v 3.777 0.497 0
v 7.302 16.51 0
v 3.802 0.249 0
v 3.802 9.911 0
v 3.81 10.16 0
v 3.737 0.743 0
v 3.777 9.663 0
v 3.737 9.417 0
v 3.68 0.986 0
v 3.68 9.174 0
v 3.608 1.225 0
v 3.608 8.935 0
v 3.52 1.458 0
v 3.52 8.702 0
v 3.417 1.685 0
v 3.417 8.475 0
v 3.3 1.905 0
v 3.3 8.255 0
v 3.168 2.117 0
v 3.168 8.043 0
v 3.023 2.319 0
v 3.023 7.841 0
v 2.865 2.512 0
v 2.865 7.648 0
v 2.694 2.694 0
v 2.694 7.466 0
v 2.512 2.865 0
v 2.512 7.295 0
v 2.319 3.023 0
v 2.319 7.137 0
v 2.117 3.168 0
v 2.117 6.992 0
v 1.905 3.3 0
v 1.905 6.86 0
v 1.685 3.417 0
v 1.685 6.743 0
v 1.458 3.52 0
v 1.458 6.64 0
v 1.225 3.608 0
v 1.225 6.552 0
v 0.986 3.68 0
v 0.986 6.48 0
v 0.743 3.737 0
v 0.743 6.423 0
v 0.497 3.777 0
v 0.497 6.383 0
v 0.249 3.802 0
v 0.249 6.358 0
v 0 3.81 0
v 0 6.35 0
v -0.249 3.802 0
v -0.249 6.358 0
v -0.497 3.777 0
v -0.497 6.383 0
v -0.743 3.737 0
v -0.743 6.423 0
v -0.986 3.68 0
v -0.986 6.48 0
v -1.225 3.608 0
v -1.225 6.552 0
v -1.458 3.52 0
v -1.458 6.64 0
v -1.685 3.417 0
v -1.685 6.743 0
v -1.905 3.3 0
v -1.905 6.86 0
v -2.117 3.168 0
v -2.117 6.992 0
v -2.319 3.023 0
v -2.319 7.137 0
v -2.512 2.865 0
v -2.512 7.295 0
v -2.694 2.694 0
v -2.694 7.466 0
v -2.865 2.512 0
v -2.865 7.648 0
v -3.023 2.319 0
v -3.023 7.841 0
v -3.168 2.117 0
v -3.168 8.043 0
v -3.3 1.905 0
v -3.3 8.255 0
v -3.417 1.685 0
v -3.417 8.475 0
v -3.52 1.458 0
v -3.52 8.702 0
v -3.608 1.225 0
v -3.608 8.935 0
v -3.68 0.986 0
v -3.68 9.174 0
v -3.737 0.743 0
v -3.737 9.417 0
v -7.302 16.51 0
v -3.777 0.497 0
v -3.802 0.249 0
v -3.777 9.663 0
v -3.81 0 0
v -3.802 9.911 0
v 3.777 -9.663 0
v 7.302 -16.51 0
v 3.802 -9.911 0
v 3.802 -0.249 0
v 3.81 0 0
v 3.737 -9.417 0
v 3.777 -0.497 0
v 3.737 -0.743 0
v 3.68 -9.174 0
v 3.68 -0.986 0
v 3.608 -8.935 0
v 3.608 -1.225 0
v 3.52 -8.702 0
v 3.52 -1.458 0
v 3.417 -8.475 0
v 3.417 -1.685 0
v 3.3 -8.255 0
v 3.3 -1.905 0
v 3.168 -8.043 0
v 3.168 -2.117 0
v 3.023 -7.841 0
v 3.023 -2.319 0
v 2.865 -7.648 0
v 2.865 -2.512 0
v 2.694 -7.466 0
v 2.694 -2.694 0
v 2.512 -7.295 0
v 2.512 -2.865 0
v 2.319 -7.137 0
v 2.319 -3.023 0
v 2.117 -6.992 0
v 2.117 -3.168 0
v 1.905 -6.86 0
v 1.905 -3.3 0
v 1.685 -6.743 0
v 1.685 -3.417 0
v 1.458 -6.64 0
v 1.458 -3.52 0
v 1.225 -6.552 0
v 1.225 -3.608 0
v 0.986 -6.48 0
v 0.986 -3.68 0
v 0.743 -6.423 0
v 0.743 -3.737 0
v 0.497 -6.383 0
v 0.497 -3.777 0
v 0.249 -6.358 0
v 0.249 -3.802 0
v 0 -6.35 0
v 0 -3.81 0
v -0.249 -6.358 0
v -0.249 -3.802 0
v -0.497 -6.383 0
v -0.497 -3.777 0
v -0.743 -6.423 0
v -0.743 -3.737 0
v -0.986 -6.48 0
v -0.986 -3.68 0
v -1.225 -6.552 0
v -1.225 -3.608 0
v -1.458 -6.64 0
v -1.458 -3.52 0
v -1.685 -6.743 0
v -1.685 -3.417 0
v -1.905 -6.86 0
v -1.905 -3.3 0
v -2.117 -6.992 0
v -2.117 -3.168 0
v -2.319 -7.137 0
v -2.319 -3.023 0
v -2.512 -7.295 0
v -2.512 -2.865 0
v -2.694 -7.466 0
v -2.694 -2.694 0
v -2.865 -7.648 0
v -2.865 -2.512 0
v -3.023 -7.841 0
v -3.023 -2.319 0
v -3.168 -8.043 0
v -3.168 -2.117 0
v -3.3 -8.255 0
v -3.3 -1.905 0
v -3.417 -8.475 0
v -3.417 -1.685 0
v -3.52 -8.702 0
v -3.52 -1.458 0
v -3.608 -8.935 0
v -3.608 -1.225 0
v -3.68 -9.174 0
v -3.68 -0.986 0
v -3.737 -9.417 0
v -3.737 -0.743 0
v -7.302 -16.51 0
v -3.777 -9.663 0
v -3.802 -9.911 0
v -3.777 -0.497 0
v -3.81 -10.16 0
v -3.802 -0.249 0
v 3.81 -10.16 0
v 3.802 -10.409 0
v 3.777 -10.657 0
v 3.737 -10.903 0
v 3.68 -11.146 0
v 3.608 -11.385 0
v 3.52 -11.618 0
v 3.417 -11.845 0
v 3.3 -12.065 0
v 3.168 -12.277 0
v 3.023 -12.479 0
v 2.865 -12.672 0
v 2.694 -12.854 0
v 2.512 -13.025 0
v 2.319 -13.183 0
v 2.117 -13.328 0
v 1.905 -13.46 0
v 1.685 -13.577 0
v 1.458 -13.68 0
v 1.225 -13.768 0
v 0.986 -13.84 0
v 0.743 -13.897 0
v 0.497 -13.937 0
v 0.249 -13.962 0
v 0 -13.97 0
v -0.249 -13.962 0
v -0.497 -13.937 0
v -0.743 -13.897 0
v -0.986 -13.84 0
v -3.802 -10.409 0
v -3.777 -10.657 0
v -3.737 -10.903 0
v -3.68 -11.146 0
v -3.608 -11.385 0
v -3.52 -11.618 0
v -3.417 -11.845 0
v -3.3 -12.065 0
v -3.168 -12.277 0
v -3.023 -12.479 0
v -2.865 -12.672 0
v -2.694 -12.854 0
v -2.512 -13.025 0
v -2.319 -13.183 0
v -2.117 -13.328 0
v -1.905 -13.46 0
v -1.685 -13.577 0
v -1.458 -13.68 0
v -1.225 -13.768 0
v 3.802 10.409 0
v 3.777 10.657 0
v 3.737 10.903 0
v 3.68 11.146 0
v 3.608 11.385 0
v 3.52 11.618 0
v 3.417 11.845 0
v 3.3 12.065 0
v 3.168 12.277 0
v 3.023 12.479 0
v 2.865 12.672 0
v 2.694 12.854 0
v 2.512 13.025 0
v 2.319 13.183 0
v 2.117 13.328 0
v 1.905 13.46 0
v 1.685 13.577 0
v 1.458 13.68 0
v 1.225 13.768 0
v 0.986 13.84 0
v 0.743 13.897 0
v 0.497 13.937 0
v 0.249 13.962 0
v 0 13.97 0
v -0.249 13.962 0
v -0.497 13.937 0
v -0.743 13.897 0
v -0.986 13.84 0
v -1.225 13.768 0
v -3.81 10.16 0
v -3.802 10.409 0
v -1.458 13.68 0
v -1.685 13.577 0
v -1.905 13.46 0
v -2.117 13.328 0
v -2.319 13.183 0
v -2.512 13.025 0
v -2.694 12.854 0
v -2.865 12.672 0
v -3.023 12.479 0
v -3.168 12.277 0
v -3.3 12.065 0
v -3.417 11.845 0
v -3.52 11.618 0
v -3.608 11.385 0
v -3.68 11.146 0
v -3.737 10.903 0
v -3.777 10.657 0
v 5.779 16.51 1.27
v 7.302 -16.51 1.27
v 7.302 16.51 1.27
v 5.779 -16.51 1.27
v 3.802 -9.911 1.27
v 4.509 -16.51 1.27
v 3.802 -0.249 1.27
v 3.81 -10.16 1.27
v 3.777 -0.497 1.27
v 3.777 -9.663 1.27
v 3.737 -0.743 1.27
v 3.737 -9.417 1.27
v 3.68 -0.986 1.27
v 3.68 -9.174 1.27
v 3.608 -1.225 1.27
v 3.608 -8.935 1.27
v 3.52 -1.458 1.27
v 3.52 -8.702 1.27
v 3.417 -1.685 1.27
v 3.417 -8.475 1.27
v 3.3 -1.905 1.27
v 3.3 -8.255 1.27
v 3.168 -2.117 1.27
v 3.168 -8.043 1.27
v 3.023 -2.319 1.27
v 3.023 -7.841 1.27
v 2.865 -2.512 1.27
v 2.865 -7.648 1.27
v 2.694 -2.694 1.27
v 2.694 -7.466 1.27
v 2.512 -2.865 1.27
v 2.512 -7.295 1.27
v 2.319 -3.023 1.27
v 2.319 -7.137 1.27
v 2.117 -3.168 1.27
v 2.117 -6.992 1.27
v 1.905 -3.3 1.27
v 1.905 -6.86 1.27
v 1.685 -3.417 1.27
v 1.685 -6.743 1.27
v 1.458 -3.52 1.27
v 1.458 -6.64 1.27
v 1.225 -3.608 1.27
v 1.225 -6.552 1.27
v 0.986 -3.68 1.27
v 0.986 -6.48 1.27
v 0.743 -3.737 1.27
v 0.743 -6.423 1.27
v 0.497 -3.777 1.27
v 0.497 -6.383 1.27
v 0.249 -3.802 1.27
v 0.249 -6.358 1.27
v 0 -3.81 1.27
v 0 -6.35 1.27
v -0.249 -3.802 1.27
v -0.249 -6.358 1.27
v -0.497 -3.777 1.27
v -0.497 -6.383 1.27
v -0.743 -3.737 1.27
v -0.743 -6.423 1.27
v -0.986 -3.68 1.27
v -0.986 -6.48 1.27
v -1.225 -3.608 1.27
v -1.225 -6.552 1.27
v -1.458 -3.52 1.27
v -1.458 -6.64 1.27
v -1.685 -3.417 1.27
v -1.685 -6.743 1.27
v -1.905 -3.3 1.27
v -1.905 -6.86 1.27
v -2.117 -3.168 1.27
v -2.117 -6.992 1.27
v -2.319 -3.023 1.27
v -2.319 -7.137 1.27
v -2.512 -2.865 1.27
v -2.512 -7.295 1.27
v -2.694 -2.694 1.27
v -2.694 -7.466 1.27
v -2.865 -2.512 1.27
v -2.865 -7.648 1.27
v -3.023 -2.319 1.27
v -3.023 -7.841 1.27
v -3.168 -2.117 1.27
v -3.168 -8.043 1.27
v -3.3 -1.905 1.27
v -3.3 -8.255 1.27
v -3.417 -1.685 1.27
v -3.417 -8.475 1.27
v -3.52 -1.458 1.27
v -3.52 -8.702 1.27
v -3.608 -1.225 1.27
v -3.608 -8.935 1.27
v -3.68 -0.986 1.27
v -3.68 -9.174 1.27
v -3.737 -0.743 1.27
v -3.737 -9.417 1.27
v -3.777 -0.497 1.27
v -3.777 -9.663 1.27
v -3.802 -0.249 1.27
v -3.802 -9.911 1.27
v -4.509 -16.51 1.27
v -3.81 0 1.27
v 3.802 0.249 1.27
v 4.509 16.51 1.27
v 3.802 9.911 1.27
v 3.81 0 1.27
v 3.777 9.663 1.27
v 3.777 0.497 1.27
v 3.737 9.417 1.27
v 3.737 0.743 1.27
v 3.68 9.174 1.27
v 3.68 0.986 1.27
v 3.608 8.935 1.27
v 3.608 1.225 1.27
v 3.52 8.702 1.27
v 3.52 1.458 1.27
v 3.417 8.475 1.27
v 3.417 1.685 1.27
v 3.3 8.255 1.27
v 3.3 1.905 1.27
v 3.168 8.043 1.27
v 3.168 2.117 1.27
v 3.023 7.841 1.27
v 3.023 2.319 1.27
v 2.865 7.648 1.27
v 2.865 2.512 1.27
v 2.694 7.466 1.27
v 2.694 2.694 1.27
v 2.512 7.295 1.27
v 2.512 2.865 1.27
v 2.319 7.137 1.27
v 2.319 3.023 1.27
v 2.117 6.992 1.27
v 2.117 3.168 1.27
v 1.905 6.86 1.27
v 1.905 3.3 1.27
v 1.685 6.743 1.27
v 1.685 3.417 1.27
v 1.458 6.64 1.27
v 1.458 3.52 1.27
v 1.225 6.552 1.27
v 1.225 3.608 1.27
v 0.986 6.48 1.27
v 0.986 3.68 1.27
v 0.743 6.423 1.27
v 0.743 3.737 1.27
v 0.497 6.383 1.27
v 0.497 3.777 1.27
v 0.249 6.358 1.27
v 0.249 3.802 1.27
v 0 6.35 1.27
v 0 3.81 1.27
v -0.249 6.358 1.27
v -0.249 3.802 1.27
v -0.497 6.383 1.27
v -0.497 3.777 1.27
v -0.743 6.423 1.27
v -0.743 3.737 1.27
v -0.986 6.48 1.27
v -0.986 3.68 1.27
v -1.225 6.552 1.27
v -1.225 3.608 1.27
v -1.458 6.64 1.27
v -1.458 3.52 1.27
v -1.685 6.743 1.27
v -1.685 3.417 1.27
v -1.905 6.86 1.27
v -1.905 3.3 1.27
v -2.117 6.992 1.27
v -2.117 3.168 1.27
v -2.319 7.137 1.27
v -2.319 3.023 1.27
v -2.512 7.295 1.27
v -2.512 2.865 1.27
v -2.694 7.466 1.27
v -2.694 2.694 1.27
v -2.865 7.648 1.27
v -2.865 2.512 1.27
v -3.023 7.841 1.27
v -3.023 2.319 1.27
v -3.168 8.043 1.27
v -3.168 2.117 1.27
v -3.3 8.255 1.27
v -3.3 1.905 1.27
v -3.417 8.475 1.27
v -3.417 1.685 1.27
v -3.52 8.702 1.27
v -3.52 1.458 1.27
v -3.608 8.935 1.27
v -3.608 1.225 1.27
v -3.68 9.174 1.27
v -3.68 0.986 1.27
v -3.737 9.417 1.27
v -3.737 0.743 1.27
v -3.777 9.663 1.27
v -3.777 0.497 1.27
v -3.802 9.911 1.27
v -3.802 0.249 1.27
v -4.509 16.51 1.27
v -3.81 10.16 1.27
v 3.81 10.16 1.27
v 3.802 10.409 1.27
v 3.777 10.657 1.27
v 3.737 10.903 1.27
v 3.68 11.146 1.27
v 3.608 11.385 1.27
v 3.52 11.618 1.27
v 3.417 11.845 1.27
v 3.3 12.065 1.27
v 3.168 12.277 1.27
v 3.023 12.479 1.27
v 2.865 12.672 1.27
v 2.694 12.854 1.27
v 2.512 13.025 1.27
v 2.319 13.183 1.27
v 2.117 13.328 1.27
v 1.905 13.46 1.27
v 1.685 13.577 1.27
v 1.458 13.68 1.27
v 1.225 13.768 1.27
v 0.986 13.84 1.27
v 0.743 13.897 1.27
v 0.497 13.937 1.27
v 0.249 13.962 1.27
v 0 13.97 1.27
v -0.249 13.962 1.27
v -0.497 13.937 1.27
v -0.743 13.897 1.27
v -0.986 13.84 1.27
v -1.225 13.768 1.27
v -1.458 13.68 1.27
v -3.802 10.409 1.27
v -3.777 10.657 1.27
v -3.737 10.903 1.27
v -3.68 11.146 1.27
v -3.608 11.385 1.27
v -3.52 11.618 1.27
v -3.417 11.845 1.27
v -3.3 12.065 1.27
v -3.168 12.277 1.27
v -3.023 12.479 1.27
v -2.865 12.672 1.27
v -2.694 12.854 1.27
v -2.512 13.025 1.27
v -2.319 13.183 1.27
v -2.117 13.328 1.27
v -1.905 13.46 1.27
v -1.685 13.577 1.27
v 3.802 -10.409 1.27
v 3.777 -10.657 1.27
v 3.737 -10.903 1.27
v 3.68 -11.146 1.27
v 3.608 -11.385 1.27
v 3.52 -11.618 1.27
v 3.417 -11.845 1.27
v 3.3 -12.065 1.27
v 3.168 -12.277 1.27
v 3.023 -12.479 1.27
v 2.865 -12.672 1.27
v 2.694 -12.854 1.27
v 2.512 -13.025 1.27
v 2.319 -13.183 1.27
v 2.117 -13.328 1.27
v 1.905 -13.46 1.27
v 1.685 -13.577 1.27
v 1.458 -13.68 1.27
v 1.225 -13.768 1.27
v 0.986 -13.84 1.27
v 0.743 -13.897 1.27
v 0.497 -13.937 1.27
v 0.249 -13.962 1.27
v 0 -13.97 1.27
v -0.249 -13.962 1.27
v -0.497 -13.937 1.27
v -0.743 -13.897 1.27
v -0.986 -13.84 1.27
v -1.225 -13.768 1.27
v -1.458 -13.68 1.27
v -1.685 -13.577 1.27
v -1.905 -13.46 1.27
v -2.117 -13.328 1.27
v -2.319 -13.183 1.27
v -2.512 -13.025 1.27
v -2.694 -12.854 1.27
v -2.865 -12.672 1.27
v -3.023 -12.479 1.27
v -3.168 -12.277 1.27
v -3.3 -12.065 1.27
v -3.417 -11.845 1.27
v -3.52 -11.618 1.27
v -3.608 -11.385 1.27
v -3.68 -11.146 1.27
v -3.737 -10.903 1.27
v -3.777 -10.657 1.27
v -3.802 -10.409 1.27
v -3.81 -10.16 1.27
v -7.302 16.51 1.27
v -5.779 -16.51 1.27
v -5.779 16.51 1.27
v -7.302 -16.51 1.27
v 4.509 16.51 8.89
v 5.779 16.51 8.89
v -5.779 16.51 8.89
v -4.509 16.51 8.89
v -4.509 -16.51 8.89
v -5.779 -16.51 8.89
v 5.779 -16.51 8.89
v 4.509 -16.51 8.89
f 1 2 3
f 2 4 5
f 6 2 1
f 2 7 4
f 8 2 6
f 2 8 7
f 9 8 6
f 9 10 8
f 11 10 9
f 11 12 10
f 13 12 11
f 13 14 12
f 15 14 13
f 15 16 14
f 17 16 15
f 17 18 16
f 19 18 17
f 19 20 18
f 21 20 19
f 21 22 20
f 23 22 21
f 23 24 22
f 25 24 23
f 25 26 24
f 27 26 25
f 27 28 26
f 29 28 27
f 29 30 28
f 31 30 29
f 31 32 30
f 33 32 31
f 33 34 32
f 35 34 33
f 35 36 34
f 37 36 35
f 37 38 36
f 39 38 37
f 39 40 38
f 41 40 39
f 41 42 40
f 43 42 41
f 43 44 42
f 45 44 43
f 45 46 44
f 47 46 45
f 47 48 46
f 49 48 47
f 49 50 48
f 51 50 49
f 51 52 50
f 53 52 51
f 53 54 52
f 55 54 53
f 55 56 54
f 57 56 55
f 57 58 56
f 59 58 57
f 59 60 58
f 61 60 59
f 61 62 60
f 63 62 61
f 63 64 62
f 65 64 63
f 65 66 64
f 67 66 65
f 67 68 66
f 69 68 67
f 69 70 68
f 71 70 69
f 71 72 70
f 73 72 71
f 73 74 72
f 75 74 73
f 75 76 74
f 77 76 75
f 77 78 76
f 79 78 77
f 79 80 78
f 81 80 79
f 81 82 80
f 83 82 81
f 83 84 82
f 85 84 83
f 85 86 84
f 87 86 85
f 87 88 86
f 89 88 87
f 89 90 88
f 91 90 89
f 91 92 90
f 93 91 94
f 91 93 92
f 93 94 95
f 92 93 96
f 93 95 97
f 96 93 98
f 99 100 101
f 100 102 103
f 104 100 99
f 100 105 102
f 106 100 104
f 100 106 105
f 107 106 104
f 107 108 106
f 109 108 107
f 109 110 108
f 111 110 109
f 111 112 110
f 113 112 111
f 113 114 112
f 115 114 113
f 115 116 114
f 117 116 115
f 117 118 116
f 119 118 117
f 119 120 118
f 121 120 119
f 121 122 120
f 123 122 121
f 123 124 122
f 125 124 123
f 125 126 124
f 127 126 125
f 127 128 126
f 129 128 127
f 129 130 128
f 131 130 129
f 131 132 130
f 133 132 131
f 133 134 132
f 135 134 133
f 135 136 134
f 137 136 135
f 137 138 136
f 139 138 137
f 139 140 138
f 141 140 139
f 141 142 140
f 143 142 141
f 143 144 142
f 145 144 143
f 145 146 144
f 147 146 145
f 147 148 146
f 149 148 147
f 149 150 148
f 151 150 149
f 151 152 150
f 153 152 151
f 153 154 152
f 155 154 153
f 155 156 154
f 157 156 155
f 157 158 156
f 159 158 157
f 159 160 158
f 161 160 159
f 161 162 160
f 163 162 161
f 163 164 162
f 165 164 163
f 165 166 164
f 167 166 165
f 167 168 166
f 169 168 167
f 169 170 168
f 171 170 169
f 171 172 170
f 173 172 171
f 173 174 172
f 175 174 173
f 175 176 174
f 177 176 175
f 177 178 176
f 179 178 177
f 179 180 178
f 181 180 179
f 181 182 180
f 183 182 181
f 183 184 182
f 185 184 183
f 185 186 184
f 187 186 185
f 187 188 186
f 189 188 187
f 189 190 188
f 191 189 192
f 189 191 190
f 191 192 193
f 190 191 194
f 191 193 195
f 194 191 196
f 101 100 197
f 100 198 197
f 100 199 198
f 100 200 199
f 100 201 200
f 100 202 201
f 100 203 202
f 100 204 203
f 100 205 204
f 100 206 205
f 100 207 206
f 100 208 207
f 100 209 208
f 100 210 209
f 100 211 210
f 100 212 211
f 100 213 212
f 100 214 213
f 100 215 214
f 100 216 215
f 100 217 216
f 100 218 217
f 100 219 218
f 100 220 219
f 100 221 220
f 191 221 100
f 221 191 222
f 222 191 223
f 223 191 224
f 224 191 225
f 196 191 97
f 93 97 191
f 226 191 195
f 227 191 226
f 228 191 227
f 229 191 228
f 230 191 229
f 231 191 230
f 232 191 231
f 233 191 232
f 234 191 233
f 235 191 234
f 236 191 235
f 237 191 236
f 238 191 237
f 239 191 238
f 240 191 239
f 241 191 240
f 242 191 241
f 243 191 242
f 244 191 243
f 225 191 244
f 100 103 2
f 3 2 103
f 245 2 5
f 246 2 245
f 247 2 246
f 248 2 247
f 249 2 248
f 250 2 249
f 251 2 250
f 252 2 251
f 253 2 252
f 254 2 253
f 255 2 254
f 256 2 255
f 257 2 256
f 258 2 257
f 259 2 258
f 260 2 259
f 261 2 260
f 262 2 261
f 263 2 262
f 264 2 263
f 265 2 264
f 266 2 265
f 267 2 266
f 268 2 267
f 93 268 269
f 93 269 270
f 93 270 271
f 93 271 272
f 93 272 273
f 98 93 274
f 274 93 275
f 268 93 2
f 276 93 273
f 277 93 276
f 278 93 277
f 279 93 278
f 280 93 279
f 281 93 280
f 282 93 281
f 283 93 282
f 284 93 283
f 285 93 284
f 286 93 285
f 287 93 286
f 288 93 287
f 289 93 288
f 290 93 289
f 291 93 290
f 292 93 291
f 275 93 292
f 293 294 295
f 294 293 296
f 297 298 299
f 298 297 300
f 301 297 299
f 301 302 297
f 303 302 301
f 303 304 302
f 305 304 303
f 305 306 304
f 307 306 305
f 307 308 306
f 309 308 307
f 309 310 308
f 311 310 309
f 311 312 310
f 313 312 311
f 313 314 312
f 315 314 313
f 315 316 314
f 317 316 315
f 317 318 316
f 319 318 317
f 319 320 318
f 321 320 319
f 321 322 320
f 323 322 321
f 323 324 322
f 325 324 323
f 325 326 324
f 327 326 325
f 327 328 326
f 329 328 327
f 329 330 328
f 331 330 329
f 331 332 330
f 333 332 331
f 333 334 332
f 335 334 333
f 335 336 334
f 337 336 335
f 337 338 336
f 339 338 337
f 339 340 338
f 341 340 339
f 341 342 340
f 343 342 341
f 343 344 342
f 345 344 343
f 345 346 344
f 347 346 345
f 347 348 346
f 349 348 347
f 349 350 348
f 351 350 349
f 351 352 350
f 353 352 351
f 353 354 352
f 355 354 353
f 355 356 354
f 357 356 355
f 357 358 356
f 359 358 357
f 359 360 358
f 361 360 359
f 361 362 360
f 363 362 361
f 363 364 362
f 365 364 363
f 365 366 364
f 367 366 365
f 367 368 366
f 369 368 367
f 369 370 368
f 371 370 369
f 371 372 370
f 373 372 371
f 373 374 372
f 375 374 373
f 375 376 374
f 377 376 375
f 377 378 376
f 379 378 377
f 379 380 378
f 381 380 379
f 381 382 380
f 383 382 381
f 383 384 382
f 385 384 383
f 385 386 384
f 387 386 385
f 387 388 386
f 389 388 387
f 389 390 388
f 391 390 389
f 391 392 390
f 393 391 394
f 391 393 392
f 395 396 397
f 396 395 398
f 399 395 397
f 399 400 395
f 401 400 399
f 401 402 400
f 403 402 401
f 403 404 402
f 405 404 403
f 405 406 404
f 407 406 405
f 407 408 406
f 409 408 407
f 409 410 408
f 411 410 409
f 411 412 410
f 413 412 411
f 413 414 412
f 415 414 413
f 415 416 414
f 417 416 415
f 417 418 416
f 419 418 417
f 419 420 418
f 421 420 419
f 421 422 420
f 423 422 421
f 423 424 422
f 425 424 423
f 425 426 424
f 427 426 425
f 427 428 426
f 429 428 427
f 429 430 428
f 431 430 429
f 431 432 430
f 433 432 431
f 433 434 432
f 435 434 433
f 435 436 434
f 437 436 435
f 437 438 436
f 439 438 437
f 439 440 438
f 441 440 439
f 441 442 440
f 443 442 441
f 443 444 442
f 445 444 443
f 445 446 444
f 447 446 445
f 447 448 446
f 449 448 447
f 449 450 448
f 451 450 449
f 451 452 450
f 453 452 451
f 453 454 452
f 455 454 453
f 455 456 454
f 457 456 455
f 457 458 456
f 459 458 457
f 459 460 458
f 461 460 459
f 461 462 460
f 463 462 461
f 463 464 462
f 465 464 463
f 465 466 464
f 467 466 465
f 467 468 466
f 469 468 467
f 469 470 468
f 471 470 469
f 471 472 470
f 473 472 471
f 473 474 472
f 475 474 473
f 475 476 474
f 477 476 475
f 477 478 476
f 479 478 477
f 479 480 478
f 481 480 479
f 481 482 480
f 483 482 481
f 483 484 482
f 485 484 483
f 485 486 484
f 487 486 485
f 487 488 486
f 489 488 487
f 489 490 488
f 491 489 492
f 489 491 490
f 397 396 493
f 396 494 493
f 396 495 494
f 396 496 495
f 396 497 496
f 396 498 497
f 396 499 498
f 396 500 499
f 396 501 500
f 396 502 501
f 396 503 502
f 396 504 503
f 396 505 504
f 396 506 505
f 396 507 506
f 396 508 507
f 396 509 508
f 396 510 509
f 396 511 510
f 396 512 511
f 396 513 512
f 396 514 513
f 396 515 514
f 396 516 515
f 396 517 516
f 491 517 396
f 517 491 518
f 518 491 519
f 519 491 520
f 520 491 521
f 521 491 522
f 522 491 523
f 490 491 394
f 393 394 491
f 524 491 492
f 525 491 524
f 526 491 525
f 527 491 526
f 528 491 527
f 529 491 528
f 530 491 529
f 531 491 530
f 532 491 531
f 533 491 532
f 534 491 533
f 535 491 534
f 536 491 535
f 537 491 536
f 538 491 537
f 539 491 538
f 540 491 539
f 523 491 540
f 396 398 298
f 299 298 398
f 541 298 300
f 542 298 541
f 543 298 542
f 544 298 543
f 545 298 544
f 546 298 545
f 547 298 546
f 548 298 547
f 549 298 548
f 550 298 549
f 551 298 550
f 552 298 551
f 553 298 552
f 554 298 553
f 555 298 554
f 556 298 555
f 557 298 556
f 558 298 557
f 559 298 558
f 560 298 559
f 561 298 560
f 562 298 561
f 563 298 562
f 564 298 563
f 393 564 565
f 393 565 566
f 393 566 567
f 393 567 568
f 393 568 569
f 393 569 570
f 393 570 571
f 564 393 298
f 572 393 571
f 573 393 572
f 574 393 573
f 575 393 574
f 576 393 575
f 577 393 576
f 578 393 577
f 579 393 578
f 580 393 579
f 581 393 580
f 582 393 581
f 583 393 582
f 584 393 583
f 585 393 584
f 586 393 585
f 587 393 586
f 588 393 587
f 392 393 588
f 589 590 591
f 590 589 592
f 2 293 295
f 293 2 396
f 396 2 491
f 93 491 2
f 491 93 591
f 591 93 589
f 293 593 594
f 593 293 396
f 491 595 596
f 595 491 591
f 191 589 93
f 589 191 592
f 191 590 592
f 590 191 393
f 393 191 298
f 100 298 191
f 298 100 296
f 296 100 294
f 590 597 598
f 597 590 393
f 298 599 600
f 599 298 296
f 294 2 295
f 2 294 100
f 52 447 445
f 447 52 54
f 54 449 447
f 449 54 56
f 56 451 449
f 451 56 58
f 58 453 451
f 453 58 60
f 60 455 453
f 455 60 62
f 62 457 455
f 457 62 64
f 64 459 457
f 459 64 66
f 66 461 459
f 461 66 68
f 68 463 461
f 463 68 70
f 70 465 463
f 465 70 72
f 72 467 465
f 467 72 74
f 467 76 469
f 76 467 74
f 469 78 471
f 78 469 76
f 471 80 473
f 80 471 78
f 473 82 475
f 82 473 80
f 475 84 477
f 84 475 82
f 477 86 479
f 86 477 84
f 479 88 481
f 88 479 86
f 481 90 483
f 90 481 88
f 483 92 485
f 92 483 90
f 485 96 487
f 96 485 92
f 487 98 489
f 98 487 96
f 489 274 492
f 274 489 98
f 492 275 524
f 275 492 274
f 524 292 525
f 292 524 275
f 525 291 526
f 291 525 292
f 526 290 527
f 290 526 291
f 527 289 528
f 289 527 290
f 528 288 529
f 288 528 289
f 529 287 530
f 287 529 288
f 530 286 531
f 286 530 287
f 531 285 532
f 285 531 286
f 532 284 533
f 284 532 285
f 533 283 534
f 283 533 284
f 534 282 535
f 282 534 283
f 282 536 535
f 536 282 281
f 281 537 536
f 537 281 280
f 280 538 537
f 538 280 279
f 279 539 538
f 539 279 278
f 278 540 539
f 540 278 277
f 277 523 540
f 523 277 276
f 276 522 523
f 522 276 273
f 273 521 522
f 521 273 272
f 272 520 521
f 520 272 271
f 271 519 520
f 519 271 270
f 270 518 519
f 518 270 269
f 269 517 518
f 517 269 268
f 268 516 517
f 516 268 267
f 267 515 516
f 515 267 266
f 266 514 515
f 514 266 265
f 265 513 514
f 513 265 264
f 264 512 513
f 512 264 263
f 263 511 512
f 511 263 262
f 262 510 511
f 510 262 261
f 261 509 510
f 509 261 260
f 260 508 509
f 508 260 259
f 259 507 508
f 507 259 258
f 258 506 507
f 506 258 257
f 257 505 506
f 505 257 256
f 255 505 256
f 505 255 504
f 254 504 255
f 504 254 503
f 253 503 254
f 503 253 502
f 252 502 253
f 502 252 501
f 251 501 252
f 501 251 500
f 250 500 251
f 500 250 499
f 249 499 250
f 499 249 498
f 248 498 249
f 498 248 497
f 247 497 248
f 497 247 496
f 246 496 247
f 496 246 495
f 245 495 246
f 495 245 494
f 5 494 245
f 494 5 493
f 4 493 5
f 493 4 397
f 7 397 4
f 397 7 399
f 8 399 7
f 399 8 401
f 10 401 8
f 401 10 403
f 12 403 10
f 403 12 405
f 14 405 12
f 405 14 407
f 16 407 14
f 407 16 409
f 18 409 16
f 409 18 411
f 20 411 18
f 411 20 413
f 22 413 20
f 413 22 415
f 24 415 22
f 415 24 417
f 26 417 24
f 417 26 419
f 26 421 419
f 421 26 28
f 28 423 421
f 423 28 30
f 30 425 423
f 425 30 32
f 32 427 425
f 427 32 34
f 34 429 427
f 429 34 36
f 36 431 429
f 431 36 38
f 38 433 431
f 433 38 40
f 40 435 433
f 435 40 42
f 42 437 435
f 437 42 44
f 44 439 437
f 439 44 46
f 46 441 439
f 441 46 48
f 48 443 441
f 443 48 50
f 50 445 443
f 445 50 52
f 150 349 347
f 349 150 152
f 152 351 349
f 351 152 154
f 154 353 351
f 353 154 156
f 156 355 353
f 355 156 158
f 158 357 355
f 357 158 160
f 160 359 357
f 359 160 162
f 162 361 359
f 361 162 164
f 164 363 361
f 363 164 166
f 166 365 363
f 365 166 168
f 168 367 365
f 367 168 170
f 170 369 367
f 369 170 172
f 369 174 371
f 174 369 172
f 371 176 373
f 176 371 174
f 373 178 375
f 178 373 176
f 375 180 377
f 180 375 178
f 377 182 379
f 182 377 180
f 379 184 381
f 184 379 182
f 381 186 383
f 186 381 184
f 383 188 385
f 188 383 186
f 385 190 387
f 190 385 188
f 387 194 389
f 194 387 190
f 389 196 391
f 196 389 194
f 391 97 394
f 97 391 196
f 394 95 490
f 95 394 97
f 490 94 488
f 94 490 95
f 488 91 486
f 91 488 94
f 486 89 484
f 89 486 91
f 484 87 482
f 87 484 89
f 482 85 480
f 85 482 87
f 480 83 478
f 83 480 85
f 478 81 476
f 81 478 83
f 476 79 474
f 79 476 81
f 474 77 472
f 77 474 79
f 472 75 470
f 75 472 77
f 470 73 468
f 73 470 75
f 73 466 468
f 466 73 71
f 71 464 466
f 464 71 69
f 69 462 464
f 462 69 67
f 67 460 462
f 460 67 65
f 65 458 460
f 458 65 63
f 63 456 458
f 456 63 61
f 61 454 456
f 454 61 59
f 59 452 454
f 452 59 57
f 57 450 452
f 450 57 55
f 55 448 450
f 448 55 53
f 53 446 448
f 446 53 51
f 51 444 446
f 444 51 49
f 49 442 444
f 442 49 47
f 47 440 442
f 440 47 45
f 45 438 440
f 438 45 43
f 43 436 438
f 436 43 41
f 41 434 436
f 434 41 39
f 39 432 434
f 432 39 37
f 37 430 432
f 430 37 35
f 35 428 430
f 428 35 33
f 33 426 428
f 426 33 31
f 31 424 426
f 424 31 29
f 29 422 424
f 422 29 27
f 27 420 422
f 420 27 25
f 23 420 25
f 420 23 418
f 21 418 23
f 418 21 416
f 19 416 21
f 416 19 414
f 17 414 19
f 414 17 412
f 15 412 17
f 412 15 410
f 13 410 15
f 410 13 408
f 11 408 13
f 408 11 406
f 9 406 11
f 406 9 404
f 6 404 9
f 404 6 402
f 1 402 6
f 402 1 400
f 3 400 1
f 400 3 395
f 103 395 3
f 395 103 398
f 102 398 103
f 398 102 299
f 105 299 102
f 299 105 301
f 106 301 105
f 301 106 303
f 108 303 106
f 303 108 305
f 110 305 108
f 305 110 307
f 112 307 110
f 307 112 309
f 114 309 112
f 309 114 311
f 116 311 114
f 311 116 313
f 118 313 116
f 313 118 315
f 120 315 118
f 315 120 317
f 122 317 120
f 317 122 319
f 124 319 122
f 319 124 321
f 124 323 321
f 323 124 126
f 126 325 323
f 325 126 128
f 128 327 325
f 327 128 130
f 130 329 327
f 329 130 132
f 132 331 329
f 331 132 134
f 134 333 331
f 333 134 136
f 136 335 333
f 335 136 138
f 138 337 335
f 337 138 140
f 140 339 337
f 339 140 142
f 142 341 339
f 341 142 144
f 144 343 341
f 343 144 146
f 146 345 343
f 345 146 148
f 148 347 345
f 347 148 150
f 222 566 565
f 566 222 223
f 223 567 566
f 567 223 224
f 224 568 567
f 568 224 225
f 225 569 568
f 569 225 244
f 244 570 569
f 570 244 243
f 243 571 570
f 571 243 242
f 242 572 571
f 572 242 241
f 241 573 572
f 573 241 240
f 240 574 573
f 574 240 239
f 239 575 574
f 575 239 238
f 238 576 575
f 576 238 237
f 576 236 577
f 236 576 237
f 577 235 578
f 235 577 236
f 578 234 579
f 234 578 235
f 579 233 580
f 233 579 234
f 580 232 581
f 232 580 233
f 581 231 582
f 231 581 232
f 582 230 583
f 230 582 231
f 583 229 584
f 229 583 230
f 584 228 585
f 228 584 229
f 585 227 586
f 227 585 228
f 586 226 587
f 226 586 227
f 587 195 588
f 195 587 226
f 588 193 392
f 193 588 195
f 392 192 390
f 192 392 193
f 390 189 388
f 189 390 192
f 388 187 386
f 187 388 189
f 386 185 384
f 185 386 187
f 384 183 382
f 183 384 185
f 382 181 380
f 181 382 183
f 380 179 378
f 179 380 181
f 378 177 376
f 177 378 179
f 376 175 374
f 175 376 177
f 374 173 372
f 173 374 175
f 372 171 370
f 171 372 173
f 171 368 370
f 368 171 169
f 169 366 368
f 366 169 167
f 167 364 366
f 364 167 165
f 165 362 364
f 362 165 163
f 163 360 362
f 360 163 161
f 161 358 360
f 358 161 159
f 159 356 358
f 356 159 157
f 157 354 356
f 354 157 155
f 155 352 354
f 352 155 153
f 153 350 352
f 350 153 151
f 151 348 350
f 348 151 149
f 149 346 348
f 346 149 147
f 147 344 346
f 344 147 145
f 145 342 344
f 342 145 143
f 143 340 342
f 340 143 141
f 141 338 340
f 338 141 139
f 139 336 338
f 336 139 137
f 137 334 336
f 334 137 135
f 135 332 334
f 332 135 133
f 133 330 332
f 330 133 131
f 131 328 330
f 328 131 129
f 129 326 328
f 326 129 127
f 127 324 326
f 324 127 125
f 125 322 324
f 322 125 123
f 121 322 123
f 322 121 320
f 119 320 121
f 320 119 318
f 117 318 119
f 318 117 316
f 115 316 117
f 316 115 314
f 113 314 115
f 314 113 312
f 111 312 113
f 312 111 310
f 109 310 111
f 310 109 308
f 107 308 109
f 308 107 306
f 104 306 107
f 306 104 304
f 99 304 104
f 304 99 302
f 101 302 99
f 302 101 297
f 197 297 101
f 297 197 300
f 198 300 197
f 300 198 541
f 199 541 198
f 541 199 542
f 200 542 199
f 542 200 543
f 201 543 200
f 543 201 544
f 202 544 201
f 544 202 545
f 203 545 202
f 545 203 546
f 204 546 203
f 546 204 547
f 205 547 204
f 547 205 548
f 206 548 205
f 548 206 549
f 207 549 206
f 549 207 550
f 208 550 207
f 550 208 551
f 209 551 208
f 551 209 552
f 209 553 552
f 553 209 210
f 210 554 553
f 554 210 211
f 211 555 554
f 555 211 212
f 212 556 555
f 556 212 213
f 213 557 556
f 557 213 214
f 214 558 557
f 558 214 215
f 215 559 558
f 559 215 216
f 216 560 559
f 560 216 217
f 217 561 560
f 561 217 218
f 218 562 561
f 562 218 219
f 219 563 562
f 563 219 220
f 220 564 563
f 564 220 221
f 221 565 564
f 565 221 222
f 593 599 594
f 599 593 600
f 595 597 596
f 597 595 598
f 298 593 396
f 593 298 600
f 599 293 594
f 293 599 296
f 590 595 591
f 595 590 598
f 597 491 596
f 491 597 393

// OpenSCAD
ViewScale = [0.0254, 0.0254, 0.0254];

scale(ViewScale)
{
    // cover
    linear_extrude(50)
    difference() {
    square([575, 1300], center=true);
    translate([0, -400, 0])
    circle(150, $fn=96);
    translate([0, 0, 0])
    circle(150, $fn=96);
    translate([0, 400, 0])
    circle(150, $fn=96);
    }

    translate([0, 0, 50])
    linear_extrude(300)
    difference() {
        square([455, 1300], center=true);
        square([355, 1300], center=true);
    }
}
